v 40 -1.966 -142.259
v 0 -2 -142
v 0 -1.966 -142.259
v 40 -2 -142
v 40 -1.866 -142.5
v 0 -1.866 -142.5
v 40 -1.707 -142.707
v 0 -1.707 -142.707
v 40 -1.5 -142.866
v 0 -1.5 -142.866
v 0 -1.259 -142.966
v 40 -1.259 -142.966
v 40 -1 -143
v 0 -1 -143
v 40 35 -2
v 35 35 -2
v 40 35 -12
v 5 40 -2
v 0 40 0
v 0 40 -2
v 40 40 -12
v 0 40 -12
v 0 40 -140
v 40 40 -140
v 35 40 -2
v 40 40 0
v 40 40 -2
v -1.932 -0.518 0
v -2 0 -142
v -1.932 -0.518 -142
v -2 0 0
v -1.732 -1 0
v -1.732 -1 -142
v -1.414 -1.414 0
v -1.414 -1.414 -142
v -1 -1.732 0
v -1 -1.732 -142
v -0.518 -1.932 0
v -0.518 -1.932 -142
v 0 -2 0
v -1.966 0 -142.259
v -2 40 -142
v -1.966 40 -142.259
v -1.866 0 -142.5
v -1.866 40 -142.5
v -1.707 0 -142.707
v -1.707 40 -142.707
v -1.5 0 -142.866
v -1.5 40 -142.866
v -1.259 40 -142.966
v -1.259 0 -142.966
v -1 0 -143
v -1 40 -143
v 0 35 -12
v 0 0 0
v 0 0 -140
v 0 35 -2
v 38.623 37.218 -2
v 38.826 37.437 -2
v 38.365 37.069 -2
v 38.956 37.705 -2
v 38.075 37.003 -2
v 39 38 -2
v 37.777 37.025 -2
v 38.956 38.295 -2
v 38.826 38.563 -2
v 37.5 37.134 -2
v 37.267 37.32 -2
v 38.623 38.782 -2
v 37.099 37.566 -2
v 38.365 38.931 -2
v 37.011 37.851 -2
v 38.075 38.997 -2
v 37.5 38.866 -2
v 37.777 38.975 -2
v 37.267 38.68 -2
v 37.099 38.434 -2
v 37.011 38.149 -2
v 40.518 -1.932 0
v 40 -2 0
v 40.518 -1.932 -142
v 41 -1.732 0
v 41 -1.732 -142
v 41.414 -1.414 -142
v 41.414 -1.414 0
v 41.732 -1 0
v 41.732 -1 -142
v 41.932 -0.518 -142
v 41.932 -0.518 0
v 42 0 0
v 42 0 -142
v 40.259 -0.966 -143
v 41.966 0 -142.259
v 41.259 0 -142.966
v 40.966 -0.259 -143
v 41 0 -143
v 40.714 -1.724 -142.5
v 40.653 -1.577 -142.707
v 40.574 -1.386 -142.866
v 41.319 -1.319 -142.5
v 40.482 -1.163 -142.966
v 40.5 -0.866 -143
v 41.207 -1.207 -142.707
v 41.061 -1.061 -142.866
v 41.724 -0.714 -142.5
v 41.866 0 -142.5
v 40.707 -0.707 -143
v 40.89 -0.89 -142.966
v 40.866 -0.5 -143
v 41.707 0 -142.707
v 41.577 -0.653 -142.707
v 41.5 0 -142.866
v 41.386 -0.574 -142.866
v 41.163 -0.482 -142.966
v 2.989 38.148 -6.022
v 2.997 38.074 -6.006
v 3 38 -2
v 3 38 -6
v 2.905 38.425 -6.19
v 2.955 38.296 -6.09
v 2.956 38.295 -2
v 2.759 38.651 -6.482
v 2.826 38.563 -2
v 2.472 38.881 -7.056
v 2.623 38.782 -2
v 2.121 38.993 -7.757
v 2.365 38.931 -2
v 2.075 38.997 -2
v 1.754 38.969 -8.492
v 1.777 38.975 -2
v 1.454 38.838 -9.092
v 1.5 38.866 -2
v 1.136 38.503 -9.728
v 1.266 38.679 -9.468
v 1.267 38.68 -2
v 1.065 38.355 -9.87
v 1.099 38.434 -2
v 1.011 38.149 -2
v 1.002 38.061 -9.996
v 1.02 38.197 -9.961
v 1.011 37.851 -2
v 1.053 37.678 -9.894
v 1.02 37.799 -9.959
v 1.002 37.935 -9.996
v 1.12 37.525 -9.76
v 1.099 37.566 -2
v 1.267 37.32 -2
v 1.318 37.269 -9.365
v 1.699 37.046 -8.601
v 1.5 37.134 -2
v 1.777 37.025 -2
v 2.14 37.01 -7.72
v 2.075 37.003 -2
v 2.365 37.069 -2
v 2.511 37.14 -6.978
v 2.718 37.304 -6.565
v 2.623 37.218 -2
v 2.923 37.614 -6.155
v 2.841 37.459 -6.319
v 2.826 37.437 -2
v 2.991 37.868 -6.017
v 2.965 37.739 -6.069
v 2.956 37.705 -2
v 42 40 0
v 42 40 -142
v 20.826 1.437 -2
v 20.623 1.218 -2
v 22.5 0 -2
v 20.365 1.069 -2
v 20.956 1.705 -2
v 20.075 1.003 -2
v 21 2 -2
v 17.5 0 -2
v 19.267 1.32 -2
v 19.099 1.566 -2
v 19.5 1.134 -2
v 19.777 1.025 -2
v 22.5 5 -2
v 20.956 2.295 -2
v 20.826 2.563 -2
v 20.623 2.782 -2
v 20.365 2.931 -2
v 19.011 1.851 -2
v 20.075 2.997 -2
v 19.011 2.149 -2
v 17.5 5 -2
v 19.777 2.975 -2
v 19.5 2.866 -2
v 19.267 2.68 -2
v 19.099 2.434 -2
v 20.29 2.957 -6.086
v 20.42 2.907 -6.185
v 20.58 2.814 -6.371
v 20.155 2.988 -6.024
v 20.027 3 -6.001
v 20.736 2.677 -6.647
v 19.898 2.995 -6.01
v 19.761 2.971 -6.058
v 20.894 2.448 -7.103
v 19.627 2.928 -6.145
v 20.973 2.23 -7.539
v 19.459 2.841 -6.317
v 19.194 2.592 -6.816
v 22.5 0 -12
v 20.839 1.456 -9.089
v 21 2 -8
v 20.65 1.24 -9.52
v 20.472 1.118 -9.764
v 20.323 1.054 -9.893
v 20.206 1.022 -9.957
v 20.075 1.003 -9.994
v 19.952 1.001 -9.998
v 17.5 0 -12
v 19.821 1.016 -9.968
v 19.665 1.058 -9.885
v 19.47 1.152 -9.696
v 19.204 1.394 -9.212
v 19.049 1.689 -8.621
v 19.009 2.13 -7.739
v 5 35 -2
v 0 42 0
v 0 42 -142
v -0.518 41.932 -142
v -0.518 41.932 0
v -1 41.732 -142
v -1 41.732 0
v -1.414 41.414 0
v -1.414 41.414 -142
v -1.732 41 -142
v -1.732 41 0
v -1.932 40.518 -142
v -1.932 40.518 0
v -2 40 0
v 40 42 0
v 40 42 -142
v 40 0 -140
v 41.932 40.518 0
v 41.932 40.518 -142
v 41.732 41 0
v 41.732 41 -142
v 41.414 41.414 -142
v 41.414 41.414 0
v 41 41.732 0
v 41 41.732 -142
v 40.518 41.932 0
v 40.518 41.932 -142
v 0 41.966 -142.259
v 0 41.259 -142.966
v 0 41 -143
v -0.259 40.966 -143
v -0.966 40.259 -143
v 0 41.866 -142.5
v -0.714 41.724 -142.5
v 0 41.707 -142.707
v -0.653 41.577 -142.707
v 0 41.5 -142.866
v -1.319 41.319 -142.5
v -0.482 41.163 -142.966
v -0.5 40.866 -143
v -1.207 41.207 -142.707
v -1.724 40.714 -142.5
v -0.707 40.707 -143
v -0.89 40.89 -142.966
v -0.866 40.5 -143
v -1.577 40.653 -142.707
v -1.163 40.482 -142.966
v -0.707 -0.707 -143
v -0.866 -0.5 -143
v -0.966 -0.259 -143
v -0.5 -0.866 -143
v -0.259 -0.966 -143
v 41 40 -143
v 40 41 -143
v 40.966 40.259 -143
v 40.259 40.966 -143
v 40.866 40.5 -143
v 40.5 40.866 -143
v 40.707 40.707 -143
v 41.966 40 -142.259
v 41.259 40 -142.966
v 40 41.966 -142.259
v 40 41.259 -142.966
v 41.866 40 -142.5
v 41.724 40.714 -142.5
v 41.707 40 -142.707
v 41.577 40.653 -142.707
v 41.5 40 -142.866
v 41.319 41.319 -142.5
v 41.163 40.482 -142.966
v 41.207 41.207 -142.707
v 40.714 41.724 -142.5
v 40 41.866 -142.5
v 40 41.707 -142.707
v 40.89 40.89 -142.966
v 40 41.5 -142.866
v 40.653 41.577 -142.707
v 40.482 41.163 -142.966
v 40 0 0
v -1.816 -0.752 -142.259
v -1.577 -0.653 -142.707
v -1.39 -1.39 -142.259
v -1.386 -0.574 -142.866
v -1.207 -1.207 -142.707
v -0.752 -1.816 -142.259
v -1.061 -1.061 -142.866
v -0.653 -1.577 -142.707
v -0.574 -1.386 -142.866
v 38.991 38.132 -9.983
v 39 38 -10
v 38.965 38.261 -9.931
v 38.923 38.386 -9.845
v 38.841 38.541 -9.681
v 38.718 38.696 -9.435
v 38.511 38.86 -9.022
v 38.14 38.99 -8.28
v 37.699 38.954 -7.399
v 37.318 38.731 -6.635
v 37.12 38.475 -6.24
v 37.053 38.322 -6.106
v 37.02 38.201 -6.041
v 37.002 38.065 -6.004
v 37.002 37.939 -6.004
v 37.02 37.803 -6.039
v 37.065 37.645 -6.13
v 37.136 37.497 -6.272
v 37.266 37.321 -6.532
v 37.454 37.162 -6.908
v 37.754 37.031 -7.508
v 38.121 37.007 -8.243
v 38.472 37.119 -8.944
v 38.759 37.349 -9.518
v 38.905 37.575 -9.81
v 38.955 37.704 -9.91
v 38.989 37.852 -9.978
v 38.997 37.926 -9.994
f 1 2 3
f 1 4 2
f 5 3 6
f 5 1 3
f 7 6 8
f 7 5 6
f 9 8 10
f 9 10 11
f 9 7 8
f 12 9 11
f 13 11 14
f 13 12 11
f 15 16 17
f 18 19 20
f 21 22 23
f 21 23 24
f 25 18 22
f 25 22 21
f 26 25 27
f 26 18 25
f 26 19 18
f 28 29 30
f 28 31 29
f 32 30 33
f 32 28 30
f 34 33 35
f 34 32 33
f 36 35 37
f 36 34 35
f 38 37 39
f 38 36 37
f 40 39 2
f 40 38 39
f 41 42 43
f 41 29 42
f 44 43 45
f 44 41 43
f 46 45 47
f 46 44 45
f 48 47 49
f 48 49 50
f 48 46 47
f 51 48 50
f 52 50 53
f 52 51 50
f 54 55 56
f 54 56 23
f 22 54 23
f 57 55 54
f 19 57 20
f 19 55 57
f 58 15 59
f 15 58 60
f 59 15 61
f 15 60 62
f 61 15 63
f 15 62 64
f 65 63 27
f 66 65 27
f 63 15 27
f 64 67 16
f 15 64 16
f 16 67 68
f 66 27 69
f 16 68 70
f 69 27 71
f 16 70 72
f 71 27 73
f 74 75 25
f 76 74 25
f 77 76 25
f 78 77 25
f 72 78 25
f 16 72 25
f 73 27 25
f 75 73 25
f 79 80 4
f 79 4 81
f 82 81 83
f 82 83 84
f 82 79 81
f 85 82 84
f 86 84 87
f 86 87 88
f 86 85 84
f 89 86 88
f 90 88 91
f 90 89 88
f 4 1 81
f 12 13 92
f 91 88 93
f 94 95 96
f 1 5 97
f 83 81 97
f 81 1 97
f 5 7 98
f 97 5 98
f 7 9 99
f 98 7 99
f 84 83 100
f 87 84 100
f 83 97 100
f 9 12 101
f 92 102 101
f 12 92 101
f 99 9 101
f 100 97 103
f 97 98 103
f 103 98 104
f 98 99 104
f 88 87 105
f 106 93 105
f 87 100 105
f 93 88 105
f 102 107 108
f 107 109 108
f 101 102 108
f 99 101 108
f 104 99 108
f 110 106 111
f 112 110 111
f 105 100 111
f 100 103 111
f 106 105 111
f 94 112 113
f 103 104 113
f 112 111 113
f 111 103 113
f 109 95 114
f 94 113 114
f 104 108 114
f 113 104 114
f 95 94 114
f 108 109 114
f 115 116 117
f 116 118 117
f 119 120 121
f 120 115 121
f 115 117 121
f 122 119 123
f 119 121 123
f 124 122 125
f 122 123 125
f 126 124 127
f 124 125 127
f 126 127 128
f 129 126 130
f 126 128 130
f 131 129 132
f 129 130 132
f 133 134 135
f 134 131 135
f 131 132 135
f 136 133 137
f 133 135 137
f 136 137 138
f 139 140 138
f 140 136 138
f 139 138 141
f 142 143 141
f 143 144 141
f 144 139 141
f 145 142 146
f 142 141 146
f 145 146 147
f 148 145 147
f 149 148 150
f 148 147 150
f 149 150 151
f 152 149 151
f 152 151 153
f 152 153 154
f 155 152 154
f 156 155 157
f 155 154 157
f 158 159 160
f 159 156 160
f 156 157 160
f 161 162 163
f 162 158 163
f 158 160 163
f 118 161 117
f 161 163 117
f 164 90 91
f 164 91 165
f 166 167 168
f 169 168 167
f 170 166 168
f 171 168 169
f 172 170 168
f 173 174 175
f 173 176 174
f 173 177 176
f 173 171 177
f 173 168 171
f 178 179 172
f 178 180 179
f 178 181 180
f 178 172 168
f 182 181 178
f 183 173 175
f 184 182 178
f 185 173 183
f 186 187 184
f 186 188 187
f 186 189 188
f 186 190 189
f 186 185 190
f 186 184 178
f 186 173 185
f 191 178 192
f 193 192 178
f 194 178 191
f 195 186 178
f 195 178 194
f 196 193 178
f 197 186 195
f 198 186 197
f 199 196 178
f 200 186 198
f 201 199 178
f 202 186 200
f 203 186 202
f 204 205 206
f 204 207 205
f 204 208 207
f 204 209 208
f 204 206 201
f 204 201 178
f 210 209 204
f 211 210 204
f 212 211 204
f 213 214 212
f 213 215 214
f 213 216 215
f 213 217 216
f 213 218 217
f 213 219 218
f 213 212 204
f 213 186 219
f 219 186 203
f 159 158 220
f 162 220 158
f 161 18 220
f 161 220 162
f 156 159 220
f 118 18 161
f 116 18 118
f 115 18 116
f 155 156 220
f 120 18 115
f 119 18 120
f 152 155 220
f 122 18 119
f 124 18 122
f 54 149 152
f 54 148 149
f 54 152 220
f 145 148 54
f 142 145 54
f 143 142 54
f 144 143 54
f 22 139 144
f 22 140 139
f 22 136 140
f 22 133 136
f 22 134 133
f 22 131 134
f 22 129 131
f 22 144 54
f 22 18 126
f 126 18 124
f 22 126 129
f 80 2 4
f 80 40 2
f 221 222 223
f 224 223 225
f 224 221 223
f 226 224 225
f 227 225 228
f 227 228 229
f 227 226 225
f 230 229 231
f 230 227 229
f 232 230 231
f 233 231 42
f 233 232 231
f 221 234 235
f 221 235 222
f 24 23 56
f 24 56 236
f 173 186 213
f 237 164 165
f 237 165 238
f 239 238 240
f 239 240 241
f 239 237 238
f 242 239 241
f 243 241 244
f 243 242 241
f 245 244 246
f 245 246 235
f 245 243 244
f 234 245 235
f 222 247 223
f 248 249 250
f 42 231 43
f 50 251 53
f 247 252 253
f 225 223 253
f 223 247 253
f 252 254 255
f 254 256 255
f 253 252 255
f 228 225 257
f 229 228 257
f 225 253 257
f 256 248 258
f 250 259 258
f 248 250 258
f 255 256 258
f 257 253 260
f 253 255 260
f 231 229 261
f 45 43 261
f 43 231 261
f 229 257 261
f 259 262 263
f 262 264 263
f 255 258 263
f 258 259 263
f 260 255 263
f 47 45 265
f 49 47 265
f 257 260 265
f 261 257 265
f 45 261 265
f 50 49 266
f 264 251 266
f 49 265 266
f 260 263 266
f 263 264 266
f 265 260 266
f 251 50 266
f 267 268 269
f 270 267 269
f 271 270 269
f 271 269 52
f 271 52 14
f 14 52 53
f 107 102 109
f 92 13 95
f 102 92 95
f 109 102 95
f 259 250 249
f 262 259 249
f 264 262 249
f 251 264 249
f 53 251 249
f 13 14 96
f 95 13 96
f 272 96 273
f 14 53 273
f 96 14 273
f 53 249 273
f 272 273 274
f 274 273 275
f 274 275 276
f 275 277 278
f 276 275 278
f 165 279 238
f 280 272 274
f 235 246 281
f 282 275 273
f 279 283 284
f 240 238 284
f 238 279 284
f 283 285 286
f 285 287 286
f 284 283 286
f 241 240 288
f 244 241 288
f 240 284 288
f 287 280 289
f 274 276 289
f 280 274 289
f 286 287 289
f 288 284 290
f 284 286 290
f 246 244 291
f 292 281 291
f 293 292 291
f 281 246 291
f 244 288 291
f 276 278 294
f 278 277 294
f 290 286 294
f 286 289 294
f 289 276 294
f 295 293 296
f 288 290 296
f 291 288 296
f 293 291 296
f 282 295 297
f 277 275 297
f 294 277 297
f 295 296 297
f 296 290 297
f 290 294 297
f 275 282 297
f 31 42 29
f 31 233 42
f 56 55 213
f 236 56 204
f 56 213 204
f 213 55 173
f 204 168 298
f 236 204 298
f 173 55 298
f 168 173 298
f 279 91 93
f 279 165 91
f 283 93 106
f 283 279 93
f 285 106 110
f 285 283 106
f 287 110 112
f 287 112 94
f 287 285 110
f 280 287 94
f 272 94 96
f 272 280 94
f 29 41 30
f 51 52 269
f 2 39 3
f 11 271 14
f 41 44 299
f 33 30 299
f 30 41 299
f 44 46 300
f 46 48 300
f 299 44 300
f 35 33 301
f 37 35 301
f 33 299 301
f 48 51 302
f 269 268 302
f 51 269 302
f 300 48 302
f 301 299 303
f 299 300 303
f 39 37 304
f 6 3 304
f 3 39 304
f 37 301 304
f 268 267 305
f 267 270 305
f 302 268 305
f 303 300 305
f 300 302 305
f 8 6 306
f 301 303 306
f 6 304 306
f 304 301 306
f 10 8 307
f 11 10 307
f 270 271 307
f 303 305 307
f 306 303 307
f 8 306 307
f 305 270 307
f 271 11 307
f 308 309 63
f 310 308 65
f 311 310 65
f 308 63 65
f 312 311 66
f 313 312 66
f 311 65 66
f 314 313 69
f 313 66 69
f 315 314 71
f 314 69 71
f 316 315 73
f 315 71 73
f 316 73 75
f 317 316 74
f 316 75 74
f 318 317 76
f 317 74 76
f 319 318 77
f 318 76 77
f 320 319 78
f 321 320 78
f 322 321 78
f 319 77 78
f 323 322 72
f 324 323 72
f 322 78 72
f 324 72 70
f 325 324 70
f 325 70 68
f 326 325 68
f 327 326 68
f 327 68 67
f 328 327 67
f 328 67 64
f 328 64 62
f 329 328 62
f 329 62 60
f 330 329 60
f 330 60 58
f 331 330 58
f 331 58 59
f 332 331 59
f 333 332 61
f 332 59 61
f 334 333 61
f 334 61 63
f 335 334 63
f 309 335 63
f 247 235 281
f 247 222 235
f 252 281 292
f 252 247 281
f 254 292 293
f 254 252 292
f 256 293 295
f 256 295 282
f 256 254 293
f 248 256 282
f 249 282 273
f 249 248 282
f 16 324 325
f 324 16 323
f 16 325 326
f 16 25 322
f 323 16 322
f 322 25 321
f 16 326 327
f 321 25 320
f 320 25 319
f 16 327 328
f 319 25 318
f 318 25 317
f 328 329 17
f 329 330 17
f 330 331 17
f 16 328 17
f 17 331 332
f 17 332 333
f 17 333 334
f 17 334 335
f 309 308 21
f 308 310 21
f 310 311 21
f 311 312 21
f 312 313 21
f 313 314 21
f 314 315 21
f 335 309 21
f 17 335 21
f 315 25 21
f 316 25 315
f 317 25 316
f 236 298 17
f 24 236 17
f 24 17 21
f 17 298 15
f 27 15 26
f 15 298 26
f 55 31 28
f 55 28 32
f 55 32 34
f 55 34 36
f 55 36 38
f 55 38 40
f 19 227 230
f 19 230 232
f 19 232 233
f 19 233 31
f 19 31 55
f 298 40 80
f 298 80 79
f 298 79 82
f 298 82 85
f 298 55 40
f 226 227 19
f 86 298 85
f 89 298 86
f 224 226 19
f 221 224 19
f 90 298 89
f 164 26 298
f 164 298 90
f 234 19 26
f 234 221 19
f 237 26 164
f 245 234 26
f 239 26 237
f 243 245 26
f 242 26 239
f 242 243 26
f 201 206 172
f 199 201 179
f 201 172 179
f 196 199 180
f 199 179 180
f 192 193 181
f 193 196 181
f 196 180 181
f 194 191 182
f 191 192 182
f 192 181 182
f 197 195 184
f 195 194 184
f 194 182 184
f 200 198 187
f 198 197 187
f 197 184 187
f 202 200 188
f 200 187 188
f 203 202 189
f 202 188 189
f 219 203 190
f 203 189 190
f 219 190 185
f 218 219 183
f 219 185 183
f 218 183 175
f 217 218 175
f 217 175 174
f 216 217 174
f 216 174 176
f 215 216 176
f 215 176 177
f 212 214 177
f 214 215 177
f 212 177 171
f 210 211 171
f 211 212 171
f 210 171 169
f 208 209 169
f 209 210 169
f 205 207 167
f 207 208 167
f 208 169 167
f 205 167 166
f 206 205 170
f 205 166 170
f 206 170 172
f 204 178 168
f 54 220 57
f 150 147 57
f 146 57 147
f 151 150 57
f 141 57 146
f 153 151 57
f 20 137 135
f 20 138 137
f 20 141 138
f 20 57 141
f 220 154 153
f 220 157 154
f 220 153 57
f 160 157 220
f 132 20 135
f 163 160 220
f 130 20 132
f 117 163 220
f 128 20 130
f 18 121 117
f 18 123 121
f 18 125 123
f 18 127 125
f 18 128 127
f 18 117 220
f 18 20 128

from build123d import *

# Parameters (mm, degrees)
EXTRUDE001_DEPTH = 3
FILLET_R         = 1
SKETCH_W         = 40
SKETCH_H         = 40
EXTRUDE_DEPTH    = 140
SKETCH008_R      = 1
EXTRUDE007_DEPTH = 10
EXTRUDE006_DEPTH = 5
EXTRUDE005_DEPTH = 5


with BuildPart() as fillet_body:
    # Sketch001 → Extrude001 (new body)
    with BuildSketch(Plane.XY.offset(-140)):
        with BuildLine():
            Line((0, -2), (40, -2))
            ThreePointArc((40, -2), (41.414214, -1.414214), (42, 0))
            Line((42, 0), (42, 40))
            ThreePointArc((42, 40), (41.414214, 41.414214), (40, 42))
            Line((40, 42), (0, 42))
            ThreePointArc((0, 42), (-1.414214, 41.414214), (-2, 40))
            Line((-2, 40), (-2, 0))
            ThreePointArc((-2, 0), (-1.414214, -1.414214), (0, -2))
        make_face()
    extrude(amount=-EXTRUDE001_DEPTH)

    # Fillet
    fillet_edges = [fillet_body.edges().sort_by_distance(p)[0] for p in [
        (20, 42, -143),
        (-1.414214, 41.414214, -143),
        (-2, 20, -143),
    ]]
    fillet(fillet_edges, radius=FILLET_R)


with BuildPart() as fusion:
    # Sketch → Extrude (new body)
    with BuildSketch(Plane.XY):
        with BuildLine():
            Line((0, -2), (40, -2))
            ThreePointArc((40, -2), (41.414214, -1.414214), (42, 0))
            Line((42, 0), (42, 40))
            ThreePointArc((42, 40), (41.414214, 41.414214), (40, 42))
            Line((40, 42), (0, 42))
            ThreePointArc((0, 42), (-1.414214, 41.414214), (-2, 40))
            Line((-2, 40), (-2, 0))
            ThreePointArc((-2, 0), (-1.414214, -1.414214), (0, -2))
        make_face()
        with Locations((20, 20)):
            Rectangle(SKETCH_W, SKETCH_H, mode=Mode.SUBTRACT)
    extrude(amount=-EXTRUDE_DEPTH)

    # Fusion: union Fillet body
    add(fillet_body.part)


with BuildPart() as extrude007:
    # Sketch008 → Extrude007 (new body)
    with BuildSketch(Plane.XY):
        with Locations((2, 38)):
            Circle(SKETCH008_R)
        with Locations((38, 38)):
            Circle(SKETCH008_R)
        with Locations((20, 2)):
            Circle(SKETCH008_R)
    extrude(amount=-EXTRUDE007_DEPTH)


with BuildPart() as extrude006:
    # Sketch010 → Extrude006 (new body)
    with BuildSketch(Plane.YZ.offset(17.5)):
        Polygon((0, 0), (5, 0), (0, -10), align=None)
    extrude(amount=EXTRUDE006_DEPTH)


with BuildPart() as fusion004:
    # Sketch009 → Extrude005 (new body)
    with BuildSketch(Plane.XZ.offset(-40)):
        Polygon((0, 0), (5, 0), (0, -10), align=None)
        Polygon((40, 0), (35, 0), (40, -10), align=None)
    extrude(amount=EXTRUDE005_DEPTH)

    # Fusion003: union Extrude006
    add(extrude006.part)

    # Cut: cut Extrude007
    add(extrude007.part, mode=Mode.SUBTRACT)


with BuildPart() as fusion004_1:
    # Cut placement: moved
    add(fusion004.part.moved(Location((0, 0, -2))))

    # Fusion004: union Fusion
    add(fusion.part)


solid = fusion004_1.part
